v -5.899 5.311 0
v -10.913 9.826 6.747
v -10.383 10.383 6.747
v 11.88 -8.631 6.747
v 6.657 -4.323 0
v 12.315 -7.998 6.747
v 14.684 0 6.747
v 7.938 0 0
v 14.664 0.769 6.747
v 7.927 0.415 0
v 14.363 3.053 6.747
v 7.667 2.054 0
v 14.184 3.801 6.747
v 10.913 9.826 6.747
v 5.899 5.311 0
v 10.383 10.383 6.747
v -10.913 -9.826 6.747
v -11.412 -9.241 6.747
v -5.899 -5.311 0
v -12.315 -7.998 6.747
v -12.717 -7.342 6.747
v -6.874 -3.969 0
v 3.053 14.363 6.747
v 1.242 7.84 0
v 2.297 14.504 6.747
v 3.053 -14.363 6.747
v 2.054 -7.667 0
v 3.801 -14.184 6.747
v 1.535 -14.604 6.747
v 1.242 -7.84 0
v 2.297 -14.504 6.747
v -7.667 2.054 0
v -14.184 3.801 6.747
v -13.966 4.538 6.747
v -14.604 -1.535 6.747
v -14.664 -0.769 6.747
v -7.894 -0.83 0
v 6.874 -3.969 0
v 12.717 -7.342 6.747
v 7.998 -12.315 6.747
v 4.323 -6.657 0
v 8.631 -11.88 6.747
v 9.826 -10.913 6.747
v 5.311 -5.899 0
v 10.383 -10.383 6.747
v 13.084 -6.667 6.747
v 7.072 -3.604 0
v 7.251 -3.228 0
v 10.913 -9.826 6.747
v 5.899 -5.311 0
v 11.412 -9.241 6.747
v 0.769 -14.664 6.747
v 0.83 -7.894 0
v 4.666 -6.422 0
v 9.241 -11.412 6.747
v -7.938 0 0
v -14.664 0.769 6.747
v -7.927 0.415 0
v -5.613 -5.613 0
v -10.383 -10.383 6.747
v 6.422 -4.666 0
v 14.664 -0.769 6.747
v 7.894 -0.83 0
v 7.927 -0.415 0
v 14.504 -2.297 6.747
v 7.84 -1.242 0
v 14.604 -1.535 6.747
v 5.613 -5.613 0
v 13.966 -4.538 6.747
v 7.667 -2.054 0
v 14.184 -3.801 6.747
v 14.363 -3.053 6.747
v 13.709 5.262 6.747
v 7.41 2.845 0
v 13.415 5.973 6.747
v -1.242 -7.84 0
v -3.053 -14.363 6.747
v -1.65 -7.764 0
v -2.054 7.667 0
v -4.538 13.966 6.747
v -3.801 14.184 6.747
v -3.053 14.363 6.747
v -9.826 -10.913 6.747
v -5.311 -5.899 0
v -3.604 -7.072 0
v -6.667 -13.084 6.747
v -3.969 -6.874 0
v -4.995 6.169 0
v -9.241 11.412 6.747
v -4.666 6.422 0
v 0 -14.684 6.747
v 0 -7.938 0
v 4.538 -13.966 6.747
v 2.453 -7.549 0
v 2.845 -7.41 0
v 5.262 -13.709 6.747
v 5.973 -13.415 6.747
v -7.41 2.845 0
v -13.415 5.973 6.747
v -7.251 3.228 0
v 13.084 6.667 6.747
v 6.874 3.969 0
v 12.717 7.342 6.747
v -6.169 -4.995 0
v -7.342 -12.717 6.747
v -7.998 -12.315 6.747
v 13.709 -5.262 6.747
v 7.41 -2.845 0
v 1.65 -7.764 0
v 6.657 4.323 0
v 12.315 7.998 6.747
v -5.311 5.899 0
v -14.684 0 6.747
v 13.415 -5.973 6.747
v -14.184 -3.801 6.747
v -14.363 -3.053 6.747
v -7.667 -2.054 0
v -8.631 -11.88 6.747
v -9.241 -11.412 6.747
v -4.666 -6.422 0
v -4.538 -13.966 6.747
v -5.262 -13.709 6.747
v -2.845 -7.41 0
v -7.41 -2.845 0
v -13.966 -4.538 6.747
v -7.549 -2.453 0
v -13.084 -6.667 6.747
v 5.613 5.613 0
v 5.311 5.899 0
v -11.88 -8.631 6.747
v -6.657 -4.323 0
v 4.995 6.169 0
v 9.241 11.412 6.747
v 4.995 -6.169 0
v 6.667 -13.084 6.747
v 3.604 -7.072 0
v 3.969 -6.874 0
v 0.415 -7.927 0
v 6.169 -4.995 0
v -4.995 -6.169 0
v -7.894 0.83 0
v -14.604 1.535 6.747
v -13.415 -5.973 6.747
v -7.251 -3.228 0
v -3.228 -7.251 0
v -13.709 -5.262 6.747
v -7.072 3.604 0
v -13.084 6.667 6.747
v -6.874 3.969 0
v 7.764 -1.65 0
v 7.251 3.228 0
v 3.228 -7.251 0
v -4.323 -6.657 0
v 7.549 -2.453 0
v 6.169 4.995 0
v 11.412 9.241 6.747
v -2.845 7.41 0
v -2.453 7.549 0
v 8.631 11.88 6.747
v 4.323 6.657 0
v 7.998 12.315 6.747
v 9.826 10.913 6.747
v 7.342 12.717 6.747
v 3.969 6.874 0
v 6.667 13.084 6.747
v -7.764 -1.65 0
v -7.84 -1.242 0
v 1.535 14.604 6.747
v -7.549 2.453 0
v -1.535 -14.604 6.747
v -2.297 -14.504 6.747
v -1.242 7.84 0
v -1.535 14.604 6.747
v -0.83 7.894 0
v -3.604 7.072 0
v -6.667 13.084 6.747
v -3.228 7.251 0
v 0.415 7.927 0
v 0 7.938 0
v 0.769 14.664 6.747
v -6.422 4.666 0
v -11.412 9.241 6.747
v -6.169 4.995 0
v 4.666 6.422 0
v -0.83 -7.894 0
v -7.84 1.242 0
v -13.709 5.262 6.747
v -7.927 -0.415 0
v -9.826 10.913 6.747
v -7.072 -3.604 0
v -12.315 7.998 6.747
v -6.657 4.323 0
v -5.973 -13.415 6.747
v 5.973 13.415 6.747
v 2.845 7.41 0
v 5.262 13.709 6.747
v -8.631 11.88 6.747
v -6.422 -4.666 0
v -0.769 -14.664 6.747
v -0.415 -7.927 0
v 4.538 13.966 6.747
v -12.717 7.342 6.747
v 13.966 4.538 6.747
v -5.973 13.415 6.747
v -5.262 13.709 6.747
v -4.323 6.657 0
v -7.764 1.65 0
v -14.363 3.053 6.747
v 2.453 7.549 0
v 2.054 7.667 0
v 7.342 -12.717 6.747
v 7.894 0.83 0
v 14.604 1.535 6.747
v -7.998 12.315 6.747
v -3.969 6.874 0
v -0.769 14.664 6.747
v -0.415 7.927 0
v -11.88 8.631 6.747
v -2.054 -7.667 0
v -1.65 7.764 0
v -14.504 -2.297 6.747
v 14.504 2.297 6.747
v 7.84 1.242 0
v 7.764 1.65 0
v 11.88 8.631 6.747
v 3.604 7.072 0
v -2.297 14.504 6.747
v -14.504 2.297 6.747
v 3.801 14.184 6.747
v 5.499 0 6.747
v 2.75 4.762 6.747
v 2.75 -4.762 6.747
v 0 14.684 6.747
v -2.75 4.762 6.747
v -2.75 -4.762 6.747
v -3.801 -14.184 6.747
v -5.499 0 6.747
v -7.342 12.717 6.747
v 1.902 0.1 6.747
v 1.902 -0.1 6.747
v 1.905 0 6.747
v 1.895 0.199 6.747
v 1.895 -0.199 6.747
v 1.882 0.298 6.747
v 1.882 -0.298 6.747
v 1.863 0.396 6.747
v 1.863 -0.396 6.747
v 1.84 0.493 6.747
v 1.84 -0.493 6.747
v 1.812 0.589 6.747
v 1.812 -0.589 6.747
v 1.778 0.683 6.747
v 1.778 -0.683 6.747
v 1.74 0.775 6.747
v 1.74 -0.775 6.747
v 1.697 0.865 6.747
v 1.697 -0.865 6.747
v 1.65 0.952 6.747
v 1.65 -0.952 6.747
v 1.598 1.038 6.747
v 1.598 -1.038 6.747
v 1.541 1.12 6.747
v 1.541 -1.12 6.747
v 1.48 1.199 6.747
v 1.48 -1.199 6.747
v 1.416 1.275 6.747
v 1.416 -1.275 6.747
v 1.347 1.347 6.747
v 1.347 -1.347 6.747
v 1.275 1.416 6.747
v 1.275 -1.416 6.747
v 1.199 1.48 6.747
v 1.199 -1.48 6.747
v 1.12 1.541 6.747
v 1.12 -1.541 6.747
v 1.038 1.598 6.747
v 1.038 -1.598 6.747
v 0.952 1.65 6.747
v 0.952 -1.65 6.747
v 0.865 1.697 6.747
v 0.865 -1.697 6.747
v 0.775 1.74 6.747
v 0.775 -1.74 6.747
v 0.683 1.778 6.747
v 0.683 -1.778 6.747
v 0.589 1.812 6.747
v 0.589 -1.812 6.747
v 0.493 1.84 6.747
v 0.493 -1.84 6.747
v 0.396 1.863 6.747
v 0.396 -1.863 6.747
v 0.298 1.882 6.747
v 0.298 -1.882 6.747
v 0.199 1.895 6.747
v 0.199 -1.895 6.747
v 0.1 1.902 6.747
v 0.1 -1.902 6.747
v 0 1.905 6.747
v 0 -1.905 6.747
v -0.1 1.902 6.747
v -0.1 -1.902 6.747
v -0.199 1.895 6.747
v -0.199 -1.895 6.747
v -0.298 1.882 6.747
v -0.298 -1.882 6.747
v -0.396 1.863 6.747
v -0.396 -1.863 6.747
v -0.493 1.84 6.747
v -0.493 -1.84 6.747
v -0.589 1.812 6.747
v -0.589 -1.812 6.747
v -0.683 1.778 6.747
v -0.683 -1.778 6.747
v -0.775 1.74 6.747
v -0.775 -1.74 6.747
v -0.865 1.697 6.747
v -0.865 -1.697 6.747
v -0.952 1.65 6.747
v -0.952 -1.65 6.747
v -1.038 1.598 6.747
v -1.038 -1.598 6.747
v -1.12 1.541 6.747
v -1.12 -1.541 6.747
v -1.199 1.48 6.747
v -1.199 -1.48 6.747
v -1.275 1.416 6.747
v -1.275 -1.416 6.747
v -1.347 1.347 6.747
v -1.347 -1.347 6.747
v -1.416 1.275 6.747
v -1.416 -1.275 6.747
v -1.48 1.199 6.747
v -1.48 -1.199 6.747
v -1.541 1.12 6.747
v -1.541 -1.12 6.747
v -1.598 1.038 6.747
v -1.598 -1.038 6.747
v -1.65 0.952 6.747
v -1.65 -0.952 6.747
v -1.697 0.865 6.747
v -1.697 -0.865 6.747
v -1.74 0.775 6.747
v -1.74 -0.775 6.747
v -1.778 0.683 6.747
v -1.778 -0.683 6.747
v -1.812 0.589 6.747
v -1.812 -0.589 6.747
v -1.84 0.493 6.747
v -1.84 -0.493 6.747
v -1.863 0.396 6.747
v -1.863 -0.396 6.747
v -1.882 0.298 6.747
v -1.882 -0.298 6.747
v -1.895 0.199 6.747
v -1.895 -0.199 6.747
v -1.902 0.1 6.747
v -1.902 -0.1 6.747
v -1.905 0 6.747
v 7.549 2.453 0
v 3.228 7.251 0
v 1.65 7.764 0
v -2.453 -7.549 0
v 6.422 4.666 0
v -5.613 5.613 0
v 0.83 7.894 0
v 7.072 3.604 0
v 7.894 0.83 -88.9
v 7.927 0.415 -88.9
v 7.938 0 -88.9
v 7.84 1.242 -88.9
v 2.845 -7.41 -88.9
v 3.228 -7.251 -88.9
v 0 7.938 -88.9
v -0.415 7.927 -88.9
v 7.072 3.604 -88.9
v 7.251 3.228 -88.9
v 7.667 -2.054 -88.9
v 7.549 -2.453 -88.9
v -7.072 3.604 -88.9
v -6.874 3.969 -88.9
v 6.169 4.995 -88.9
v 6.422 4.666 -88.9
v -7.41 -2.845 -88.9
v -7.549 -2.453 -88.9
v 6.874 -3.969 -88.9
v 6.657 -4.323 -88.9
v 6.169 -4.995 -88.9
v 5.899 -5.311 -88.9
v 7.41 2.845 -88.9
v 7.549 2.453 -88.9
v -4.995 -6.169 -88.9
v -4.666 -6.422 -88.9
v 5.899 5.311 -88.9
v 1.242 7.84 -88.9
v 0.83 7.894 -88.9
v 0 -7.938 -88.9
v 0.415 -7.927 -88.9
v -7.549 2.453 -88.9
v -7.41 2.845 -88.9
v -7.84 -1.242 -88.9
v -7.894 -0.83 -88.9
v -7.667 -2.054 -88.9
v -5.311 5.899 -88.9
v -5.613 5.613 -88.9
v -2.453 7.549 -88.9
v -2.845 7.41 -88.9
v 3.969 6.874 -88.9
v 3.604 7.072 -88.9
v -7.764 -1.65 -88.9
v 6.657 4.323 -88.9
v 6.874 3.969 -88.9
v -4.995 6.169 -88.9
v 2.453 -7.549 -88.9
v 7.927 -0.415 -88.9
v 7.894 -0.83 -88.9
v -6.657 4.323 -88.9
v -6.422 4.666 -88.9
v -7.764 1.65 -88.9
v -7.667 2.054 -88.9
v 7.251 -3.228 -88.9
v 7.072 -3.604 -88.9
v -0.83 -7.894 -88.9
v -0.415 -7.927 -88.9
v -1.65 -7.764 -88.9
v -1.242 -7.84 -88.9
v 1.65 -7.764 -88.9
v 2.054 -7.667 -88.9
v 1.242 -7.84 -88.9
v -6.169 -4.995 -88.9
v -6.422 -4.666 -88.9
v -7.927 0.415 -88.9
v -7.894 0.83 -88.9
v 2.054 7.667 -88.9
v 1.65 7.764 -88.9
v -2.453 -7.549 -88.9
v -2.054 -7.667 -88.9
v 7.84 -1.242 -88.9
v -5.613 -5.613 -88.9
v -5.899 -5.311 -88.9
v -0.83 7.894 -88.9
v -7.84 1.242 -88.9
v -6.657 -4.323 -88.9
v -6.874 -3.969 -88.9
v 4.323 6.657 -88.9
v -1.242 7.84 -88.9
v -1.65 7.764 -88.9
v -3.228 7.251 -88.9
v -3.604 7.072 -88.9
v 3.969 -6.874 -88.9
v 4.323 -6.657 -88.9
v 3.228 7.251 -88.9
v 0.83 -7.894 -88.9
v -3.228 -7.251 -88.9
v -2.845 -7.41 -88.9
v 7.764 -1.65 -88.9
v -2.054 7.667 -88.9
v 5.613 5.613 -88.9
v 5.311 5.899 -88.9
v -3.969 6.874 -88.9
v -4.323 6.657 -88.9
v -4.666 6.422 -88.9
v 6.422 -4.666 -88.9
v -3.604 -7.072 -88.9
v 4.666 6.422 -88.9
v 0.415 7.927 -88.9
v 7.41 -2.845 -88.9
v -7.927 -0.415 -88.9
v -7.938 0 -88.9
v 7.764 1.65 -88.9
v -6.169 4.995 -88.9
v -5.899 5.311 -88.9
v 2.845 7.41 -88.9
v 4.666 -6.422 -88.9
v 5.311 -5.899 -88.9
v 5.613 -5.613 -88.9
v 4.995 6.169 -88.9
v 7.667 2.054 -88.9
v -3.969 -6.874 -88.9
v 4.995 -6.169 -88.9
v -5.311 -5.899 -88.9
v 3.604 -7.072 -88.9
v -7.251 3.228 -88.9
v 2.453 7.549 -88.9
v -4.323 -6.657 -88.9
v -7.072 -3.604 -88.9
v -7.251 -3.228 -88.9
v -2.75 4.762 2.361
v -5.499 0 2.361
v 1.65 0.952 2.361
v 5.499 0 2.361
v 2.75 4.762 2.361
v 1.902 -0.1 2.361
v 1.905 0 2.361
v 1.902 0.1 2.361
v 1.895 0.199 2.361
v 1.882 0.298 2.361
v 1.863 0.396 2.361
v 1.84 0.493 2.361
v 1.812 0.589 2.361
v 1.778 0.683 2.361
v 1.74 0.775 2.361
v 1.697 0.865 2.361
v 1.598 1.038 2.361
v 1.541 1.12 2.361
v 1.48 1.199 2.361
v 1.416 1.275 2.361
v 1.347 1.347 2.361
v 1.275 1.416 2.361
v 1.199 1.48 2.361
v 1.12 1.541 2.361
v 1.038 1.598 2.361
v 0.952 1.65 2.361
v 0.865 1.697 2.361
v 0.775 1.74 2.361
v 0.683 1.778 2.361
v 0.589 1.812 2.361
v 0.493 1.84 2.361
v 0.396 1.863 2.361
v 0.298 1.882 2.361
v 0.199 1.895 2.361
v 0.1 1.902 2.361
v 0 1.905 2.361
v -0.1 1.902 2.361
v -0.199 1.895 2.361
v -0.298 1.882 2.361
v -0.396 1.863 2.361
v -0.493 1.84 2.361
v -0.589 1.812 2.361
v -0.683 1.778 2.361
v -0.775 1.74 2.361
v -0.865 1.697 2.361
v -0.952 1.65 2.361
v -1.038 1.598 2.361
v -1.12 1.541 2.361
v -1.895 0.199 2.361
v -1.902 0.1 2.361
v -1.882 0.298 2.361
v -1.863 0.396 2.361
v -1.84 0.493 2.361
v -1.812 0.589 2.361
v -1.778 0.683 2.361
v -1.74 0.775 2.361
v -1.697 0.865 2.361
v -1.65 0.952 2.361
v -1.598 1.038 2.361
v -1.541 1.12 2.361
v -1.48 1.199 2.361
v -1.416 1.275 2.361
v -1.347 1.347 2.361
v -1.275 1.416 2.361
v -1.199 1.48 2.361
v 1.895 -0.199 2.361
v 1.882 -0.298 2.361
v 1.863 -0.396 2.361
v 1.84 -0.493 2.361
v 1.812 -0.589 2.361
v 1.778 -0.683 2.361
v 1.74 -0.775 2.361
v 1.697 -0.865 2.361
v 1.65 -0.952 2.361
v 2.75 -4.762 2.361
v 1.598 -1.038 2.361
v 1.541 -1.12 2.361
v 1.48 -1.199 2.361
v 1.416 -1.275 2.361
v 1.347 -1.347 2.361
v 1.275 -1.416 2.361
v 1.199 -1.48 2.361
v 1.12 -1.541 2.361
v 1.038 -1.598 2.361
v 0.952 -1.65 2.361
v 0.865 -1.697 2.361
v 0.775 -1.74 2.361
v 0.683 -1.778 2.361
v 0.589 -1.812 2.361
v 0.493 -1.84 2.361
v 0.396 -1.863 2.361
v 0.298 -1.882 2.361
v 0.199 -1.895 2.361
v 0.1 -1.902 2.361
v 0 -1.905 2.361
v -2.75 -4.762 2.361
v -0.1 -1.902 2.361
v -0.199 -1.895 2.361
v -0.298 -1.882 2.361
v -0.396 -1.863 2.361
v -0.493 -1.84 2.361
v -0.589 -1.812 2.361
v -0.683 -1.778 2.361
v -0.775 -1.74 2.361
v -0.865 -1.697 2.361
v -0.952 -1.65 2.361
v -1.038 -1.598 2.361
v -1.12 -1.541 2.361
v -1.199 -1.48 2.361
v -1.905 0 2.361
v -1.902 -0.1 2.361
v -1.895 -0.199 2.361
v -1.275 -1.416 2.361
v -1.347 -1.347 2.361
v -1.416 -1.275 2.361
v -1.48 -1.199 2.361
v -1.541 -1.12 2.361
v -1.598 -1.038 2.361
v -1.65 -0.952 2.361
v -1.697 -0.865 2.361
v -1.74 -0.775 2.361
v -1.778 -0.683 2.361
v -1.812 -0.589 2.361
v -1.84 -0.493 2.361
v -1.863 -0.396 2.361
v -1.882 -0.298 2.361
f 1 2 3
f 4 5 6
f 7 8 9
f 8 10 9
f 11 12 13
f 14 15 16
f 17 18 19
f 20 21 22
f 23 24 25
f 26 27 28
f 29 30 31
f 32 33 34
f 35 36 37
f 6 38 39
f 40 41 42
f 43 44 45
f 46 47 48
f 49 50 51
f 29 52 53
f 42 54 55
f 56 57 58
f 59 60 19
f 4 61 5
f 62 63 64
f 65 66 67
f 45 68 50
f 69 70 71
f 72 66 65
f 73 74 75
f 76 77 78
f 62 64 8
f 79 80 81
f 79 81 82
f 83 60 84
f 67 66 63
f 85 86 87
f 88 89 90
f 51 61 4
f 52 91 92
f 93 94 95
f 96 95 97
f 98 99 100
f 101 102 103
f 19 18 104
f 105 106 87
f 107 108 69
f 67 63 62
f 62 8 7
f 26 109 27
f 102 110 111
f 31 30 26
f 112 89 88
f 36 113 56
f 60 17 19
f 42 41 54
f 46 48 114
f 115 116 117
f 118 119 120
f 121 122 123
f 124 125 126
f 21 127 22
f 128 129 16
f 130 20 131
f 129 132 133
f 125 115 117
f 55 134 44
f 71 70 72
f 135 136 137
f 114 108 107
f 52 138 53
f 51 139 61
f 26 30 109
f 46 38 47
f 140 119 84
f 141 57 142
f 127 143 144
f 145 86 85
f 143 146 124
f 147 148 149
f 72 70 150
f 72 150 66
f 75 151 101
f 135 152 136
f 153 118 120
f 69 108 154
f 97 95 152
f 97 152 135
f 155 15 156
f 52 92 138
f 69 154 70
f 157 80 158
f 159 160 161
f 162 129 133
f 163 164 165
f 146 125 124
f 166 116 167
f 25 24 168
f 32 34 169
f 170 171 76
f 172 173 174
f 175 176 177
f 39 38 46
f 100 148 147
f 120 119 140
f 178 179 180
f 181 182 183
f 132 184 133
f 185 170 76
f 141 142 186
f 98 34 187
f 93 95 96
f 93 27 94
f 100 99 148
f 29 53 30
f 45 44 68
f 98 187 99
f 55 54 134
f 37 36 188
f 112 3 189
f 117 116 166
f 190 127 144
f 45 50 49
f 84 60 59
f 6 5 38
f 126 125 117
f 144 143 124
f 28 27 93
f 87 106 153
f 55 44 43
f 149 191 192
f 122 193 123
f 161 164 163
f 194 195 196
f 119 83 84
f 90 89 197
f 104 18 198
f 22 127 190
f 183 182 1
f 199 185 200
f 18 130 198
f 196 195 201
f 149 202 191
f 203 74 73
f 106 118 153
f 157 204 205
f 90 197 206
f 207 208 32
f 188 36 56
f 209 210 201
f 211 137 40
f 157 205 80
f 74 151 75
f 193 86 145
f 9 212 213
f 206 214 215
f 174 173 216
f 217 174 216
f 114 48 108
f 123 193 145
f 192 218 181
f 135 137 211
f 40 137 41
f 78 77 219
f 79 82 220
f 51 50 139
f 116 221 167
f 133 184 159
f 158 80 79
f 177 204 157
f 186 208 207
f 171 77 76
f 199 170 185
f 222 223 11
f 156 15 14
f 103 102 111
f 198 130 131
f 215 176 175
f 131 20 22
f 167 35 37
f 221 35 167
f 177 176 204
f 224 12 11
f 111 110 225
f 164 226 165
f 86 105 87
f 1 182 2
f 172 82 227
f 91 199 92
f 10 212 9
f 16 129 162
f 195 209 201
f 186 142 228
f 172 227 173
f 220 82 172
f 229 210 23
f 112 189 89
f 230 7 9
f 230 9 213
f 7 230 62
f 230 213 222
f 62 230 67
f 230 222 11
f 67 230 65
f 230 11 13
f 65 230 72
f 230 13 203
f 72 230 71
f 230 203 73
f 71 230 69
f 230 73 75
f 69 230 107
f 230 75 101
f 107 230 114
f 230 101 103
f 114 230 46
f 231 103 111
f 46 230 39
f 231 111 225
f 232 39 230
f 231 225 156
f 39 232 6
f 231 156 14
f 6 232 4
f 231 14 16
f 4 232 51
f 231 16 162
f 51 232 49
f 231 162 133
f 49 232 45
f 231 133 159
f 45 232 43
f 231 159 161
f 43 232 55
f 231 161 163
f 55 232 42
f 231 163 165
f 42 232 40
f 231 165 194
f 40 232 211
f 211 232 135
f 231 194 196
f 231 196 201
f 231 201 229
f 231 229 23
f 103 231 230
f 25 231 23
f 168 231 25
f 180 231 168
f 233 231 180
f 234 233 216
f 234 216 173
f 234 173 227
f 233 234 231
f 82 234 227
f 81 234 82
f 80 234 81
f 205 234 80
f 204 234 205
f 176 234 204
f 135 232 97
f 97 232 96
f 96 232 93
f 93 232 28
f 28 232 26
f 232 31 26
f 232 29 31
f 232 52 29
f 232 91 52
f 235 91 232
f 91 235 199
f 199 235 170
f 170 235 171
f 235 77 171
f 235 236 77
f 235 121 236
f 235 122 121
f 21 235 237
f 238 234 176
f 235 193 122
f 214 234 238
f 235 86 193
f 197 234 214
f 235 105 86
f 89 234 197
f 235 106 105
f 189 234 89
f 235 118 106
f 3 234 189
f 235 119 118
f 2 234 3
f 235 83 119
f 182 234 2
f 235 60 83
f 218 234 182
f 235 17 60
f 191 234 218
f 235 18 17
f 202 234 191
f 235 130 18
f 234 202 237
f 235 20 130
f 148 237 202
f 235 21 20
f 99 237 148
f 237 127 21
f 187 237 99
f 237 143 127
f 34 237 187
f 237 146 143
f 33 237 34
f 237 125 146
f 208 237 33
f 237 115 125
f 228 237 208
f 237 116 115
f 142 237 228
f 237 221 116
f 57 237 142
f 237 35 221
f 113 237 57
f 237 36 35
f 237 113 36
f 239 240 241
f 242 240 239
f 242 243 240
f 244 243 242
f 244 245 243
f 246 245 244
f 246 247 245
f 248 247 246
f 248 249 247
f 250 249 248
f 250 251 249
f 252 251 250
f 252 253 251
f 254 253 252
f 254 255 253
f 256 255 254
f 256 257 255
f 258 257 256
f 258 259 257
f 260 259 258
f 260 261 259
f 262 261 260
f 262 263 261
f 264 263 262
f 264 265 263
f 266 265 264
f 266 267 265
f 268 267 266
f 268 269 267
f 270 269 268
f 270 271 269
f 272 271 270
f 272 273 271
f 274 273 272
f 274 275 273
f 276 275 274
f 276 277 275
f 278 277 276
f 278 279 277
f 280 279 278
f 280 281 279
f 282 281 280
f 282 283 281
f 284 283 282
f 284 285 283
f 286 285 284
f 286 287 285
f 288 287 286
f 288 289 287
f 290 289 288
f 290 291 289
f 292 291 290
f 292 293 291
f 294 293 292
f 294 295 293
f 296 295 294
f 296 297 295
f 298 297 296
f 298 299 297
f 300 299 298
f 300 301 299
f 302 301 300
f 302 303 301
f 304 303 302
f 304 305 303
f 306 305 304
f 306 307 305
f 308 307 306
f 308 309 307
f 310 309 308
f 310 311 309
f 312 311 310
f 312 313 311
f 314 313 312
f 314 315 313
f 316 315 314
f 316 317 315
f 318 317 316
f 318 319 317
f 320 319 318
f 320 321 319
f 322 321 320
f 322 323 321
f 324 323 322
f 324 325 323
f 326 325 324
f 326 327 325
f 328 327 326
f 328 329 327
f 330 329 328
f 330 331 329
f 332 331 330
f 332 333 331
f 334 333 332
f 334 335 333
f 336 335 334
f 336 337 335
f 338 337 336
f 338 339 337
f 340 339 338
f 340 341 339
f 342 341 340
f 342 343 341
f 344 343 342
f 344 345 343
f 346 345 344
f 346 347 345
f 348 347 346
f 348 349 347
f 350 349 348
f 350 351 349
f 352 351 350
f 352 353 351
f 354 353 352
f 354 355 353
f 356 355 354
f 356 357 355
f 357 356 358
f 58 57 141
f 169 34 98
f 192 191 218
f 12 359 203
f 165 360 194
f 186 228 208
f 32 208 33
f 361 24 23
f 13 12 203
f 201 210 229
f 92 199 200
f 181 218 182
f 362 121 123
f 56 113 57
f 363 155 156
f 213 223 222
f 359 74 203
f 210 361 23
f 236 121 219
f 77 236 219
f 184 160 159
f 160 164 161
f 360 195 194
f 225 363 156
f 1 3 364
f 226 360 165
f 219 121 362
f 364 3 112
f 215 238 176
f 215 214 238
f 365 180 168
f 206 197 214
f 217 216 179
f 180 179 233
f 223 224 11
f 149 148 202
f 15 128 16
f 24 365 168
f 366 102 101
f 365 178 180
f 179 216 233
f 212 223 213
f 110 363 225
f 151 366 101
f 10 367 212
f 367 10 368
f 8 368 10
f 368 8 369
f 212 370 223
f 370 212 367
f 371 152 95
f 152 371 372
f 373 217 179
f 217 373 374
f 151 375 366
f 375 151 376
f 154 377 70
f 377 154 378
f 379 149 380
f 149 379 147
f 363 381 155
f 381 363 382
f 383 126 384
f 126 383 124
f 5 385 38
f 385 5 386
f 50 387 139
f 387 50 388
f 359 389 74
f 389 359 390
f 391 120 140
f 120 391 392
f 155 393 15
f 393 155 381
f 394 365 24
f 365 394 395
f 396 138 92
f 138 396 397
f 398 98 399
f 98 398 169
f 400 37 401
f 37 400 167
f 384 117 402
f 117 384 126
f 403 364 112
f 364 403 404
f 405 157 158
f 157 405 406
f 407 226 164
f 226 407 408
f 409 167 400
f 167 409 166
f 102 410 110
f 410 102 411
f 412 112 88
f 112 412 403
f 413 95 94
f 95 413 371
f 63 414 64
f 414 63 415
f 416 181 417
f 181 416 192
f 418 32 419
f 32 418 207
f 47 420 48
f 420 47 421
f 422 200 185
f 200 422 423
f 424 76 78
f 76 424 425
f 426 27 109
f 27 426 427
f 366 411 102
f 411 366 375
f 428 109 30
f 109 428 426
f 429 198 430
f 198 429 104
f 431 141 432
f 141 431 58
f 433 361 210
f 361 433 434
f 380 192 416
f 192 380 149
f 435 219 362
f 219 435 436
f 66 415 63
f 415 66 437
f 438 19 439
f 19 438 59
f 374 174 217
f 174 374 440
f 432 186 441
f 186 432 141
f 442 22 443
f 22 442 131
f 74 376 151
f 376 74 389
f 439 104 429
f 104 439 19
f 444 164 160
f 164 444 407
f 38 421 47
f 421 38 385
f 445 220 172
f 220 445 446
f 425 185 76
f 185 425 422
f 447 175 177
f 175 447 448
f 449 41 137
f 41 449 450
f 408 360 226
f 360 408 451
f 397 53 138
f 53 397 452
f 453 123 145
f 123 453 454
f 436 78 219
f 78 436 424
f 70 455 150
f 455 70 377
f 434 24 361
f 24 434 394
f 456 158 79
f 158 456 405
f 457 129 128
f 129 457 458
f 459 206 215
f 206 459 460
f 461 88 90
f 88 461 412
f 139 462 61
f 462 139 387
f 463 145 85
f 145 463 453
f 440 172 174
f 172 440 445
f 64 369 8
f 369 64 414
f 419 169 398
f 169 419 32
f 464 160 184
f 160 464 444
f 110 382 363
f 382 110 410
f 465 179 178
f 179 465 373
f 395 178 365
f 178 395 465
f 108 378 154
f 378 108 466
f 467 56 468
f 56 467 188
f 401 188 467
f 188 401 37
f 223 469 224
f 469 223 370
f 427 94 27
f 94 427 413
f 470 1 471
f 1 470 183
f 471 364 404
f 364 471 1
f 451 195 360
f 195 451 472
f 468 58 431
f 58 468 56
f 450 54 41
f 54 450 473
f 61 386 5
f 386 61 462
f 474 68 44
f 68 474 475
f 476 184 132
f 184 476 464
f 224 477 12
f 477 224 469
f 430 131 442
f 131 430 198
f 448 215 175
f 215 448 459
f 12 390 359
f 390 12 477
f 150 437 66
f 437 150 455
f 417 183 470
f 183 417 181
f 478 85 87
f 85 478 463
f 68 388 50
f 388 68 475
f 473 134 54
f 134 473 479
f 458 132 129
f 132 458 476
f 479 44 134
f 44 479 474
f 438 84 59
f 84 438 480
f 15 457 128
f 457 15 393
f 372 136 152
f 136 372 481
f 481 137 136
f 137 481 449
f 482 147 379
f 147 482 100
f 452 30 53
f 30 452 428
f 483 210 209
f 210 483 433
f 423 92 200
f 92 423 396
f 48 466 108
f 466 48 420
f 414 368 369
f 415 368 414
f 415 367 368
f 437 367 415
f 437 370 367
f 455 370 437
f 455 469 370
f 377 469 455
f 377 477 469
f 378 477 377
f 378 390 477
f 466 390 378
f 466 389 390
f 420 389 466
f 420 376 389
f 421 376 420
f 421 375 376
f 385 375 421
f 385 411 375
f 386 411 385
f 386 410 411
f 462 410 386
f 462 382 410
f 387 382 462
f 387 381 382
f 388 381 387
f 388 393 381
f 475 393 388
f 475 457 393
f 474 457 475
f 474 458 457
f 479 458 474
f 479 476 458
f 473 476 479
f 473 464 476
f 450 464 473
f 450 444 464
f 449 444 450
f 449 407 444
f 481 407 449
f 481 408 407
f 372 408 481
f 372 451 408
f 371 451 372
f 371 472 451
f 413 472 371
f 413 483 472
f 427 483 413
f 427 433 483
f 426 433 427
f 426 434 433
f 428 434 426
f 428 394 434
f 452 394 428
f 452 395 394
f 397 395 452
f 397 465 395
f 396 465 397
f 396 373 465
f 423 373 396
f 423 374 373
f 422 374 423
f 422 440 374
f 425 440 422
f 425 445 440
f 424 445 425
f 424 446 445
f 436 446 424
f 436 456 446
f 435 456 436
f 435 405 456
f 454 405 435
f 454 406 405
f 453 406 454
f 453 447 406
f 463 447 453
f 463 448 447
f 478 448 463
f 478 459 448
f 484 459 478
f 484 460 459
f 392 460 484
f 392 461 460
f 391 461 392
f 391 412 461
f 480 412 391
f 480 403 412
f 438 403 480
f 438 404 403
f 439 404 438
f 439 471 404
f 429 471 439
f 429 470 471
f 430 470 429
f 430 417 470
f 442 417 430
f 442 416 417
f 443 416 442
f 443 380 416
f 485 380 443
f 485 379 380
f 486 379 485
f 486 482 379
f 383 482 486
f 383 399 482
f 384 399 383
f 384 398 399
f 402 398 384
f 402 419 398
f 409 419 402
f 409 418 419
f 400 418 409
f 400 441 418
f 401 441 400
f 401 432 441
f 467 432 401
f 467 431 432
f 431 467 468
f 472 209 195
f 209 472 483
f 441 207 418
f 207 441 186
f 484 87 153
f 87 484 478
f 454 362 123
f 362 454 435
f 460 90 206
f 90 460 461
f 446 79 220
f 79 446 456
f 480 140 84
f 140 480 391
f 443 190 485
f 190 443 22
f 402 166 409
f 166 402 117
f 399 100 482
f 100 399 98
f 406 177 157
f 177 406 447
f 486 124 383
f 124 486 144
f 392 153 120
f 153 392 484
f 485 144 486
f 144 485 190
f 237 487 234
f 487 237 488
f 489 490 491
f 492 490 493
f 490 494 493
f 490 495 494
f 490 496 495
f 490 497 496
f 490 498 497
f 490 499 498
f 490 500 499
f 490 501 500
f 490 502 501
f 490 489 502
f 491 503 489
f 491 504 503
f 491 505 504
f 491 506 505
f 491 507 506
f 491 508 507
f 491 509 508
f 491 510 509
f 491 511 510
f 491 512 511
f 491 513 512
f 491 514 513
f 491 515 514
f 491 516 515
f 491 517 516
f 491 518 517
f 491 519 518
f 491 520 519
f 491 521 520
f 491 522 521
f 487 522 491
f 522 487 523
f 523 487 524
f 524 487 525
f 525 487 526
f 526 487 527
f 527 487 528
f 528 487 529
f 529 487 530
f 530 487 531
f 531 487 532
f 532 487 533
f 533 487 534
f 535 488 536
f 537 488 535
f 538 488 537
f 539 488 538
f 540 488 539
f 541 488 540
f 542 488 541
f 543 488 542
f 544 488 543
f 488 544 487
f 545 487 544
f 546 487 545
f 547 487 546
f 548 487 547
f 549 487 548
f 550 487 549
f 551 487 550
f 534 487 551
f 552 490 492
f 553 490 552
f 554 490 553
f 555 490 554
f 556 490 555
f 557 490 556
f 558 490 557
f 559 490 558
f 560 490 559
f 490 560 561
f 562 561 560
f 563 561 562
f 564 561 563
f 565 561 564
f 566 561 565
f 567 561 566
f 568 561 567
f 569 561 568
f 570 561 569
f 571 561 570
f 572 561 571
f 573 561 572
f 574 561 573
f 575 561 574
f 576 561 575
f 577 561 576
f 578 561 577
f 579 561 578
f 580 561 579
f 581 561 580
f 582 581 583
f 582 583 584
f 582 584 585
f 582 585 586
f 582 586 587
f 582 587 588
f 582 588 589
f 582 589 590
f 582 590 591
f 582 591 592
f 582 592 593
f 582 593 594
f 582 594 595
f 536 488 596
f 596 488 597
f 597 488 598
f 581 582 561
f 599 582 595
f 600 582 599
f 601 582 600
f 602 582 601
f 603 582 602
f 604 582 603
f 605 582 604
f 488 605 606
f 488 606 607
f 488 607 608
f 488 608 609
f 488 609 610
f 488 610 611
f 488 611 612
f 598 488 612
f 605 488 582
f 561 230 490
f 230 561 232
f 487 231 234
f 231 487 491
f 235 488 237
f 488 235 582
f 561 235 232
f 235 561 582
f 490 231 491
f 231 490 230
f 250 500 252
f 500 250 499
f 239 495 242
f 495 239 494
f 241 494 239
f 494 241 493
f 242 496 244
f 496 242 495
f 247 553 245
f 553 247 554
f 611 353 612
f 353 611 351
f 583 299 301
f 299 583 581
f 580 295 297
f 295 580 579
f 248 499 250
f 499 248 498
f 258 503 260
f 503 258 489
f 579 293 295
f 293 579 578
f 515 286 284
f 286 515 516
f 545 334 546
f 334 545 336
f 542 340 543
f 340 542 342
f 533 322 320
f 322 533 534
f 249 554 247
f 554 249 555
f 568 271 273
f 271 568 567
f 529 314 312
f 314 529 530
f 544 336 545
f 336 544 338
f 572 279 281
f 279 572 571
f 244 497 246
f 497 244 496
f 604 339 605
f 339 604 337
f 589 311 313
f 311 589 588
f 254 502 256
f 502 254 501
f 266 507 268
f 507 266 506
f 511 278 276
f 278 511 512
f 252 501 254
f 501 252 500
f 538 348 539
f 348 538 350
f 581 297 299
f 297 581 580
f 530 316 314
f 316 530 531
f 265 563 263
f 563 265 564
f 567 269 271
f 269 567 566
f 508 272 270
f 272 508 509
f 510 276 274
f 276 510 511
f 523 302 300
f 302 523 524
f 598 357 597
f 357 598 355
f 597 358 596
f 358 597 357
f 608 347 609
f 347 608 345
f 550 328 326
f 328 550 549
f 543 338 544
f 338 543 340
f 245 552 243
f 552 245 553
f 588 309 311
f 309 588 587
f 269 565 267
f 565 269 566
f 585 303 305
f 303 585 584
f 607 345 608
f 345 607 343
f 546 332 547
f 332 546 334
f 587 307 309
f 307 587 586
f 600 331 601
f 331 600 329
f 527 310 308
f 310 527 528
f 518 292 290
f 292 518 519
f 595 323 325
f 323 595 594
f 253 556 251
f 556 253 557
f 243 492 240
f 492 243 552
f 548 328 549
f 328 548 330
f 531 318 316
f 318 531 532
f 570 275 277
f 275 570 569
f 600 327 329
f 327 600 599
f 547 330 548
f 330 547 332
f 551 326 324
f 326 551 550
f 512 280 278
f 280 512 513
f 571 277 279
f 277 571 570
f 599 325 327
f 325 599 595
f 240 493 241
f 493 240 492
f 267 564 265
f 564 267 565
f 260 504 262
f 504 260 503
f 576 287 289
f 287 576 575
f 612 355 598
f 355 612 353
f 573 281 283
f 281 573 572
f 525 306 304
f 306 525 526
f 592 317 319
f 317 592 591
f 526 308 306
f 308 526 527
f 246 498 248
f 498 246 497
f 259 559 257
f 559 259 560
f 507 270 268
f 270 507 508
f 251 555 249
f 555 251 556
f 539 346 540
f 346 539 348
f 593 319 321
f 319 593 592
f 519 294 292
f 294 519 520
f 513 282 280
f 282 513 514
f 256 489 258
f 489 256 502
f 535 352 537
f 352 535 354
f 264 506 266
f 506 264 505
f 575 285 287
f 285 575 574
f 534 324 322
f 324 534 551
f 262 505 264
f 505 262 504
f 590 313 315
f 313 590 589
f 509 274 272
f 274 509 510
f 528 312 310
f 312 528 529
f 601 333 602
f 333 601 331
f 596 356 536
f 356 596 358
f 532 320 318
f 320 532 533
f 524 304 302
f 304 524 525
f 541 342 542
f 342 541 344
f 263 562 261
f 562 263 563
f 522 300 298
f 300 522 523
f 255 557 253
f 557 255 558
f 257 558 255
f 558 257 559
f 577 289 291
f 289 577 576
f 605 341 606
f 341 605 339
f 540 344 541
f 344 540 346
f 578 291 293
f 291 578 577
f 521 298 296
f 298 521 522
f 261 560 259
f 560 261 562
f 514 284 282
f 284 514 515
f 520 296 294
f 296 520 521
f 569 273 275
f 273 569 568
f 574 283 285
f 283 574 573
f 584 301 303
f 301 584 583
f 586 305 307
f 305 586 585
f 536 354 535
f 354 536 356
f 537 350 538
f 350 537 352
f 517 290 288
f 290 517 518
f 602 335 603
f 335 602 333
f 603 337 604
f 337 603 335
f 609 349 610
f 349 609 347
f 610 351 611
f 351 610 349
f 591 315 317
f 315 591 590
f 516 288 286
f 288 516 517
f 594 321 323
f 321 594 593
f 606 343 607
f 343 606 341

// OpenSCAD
// =================================================================
// FLAT COUNTERSUNK PIN-IN-HEX (SECURITY ALLEN) BOLT
// Combines high-torque hex drive with an anti-bypass center pin
// =================================================================

$fn = 120; // High resolution rendering

/* [Select Size Preset] */
bolt_preset = "5/8-11"; // [ "5/8-11", "1/2-13", "3/8-16" ]

function get_nominal_dia(p) = (p=="5/8-11") ? 15.875 : (p=="1/2-13") ? 12.7 : 9.525;
function get_nominal_len(p) = (p=="5/8-11") ? 88.9 : (p=="1/2-13") ? 63.5 : 38.1;

d_nominal = get_nominal_dia(bolt_preset);
l_nominal = get_nominal_len(bolt_preset);

// 82-Degree Countersunk Head Scaling for flush roadway alignment
head_dia    = d_nominal * 1.85; 
head_ht     = (head_dia - d_nominal) / 2; 

/* [Security Hex Parameters] */
hex_size    = d_nominal * 0.60;  // Width across flats of the hex socket
hex_depth   = head_ht * 0.65;    // Deep socket wall engagement
pin_dia     = d_nominal * 0.24;  // Center security post diameter

difference() {
    union() {
        // Flat countersunk head cone
        cylinder(d1=d_nominal, d2=head_dia, h=head_ht);
        
        // Unthreaded bolt shank (threads cut natively by machine shop lathe)
        translate([0, 0, -l_nominal])
            cylinder(d=d_nominal, h=l_nominal);
    }
    
    // Subtract the Hexagonal Socket Recess
    translate([0, 0, head_ht - hex_depth]) {
        difference() {
            // Hexagon cutout (6-sided polygon)
            linear_extrude(height = hex_depth + 0.1) {
                circle(d = hex_size / cos(30), $fn = 6);
            }
            
            // ANTI-BYPASS PIN: Leaving a solid metal cylinder in the center
            // This prevents a standard, solid Allen socket from seating
            translate([0, 0, -0.05])
                cylinder(d=pin_dia, h=hex_depth + 0.2);
        }
    }
}
